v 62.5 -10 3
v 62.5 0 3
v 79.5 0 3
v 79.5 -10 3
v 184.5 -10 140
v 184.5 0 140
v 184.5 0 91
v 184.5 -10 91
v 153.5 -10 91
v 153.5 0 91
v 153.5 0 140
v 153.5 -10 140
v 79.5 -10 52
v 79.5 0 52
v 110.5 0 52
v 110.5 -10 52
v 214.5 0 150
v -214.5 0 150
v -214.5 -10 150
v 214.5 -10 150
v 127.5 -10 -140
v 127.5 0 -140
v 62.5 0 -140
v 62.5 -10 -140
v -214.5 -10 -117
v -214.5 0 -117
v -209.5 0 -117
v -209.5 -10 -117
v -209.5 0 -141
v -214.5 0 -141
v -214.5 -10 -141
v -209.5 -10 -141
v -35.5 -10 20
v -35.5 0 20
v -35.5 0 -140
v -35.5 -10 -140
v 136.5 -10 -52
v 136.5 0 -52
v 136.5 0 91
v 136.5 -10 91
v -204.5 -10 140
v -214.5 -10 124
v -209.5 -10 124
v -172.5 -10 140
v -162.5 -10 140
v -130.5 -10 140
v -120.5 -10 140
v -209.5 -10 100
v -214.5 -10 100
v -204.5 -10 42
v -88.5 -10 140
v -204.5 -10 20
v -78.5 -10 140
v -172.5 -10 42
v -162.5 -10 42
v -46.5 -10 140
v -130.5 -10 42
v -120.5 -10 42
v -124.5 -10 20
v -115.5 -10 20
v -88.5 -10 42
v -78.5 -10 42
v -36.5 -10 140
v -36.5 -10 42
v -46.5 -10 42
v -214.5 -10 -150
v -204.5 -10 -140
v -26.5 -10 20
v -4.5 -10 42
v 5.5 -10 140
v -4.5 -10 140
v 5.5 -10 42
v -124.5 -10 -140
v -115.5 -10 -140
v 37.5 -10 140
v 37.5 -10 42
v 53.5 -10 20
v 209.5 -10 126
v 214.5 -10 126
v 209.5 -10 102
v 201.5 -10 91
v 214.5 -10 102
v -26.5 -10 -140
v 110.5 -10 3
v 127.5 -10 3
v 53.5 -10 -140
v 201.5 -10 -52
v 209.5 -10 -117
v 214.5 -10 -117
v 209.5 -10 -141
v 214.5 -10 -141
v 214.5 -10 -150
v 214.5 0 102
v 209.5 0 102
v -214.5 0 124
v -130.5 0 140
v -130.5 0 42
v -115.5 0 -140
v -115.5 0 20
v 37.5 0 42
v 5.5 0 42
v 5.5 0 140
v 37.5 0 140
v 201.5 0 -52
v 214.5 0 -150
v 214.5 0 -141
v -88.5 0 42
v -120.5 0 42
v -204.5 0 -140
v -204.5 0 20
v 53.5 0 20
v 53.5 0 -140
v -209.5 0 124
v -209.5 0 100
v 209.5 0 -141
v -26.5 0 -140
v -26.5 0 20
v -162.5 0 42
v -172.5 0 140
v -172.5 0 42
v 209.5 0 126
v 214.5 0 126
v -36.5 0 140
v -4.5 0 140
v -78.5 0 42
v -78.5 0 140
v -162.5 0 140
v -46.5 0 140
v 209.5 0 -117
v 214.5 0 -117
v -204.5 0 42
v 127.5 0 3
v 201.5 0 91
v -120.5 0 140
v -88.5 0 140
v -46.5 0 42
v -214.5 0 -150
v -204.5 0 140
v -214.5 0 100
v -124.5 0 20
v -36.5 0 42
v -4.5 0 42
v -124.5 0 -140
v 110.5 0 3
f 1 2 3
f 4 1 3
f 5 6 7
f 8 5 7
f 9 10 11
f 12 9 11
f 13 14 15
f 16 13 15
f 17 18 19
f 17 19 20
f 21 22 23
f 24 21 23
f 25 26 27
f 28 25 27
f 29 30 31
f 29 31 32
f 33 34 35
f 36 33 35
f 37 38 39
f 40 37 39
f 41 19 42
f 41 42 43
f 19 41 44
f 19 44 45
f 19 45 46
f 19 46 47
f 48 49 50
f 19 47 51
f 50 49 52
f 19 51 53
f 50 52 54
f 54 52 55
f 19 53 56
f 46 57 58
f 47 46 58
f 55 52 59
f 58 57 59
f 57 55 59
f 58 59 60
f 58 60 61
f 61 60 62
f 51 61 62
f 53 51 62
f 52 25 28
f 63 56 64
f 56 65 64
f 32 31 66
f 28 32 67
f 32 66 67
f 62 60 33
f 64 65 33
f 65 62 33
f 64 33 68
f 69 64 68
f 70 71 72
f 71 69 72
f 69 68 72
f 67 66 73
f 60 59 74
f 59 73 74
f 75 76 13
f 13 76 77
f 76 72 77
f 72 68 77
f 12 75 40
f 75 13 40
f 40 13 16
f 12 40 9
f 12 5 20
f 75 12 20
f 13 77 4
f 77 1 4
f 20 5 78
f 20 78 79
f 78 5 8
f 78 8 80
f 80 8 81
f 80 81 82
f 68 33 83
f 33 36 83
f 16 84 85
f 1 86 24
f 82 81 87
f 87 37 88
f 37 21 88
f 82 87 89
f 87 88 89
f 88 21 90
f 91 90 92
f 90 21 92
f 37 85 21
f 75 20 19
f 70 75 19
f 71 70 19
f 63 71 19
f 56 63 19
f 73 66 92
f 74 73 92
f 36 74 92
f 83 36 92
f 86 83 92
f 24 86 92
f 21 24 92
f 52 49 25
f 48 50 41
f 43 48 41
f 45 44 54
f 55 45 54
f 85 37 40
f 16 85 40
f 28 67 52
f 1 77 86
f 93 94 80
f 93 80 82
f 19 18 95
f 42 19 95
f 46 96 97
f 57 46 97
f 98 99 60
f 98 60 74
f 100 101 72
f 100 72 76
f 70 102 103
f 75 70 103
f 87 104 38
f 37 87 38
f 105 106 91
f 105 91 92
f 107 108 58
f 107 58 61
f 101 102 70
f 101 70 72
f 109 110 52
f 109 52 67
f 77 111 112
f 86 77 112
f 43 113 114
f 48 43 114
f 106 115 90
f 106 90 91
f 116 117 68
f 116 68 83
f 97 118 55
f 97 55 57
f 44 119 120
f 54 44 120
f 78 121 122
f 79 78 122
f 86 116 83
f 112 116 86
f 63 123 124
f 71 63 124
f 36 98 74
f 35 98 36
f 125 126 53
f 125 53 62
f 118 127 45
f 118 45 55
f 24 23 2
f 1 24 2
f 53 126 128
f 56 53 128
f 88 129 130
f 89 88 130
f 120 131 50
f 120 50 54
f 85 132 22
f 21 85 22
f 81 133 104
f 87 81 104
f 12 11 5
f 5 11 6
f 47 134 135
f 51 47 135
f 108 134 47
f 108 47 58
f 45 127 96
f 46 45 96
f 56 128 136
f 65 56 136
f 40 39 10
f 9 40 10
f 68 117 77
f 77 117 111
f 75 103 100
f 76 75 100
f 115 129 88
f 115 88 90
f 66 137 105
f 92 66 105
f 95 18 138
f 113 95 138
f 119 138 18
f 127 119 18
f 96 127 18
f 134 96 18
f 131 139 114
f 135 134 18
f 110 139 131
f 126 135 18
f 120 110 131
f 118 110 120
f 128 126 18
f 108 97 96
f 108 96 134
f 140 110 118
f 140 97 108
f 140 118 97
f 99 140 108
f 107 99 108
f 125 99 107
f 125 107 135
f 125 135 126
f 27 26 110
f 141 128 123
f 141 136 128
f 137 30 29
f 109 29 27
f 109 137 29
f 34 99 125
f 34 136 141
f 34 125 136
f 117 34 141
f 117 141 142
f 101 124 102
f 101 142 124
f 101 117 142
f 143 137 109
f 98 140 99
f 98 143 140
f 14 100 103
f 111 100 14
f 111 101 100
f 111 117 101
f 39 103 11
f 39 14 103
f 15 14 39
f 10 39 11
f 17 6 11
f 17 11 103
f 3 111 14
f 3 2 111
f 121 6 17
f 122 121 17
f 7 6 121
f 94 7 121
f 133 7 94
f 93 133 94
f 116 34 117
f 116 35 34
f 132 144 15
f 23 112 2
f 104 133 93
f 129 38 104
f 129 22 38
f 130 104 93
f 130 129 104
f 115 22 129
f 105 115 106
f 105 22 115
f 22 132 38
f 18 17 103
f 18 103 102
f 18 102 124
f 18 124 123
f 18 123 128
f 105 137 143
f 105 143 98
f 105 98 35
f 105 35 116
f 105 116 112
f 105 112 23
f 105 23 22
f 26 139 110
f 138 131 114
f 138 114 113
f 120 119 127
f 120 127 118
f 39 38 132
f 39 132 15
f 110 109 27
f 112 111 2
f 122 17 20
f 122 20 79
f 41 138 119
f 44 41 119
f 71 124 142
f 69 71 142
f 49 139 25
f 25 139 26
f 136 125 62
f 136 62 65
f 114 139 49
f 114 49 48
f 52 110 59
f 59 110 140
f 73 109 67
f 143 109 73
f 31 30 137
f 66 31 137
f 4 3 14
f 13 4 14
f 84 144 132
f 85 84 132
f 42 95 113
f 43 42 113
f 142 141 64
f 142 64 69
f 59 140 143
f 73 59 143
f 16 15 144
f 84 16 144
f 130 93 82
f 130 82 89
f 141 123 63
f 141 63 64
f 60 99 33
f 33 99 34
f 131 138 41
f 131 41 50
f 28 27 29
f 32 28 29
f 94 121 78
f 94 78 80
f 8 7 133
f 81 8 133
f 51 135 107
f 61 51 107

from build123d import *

# Parameters (mm, degrees)
SKETCH1_W           = 429
SKETCH1_H           = 300
BOSS_EXTRUDE1_DEPTH = 10
SKETCH2_W           = 80
SKETCH2_H           = 160
SKETCH2_W_2         = 32
SKETCH2_H_2         = 98
SKETCH2_W_3         = 5
SKETCH2_H_3         = 24
CUT_EXTRUDE1_DEPTH  = 10


with BuildPart() as part:
    # Sketch1 → Boss-Extrude1 (new body)
    with BuildSketch(Plane(origin=(0, 0, 0), x_dir=(1, 0, 0), z_dir=(0, 1, 0))):
        Rectangle(SKETCH1_W, SKETCH1_H)
    extrude(amount=-BOSS_EXTRUDE1_DEPTH)

    # Sketch2 → Cut-Extrude1 (cut)
    with BuildSketch(Plane(origin=(0, 0, 0), x_dir=(1, 0, 0), z_dir=(0, 1, 0))):
        with Locations((-164.5, 60)):
            Rectangle(SKETCH2_W, SKETCH2_H)
        with Locations((-75.5, 60)):
            Rectangle(SKETCH2_W, SKETCH2_H)
        with Locations((13.5, 60)):
            Rectangle(SKETCH2_W, SKETCH2_H)
        Polygon((127.5, 140), (62.5, 140), (62.5, -3), (79.5, -3), (79.5, -52), (110.5, -52), (110.5, -3), (127.5, -3), align=None)
        with Locations((-146.5, -91)):
            Rectangle(SKETCH2_W_2, SKETCH2_H_2)
        with Locations((-188.5, -91)):
            Rectangle(SKETCH2_W_2, SKETCH2_H_2)
        with Locations((-104.5, -91)):
            Rectangle(SKETCH2_W_2, SKETCH2_H_2)
        with Locations((-62.5, -91)):
            Rectangle(SKETCH2_W_2, SKETCH2_H_2)
        with Locations((-20.5, -91)):
            Rectangle(SKETCH2_W_2, SKETCH2_H_2)
        with Locations((21.5, -91)):
            Rectangle(SKETCH2_W_2, SKETCH2_H_2)
        Polygon((153.5, -140), (184.5, -140), (184.5, -91), (201.5, -91), (201.5, 52), (136.5, 52), (136.5, -91), (153.5, -91), align=None)
        with Locations((-212, 129)):
            Rectangle(SKETCH2_W_3, SKETCH2_H_3)
        with Locations((212, -114)):
            Rectangle(SKETCH2_W_3, SKETCH2_H_3)
        with Locations((212, 129)):
            Rectangle(SKETCH2_W_3, SKETCH2_H_3)
        with Locations((-212, -112)):
            Rectangle(SKETCH2_W_3, SKETCH2_H_3)
    extrude(amount=-CUT_EXTRUDE1_DEPTH, mode=Mode.SUBTRACT)


solid = part.part
